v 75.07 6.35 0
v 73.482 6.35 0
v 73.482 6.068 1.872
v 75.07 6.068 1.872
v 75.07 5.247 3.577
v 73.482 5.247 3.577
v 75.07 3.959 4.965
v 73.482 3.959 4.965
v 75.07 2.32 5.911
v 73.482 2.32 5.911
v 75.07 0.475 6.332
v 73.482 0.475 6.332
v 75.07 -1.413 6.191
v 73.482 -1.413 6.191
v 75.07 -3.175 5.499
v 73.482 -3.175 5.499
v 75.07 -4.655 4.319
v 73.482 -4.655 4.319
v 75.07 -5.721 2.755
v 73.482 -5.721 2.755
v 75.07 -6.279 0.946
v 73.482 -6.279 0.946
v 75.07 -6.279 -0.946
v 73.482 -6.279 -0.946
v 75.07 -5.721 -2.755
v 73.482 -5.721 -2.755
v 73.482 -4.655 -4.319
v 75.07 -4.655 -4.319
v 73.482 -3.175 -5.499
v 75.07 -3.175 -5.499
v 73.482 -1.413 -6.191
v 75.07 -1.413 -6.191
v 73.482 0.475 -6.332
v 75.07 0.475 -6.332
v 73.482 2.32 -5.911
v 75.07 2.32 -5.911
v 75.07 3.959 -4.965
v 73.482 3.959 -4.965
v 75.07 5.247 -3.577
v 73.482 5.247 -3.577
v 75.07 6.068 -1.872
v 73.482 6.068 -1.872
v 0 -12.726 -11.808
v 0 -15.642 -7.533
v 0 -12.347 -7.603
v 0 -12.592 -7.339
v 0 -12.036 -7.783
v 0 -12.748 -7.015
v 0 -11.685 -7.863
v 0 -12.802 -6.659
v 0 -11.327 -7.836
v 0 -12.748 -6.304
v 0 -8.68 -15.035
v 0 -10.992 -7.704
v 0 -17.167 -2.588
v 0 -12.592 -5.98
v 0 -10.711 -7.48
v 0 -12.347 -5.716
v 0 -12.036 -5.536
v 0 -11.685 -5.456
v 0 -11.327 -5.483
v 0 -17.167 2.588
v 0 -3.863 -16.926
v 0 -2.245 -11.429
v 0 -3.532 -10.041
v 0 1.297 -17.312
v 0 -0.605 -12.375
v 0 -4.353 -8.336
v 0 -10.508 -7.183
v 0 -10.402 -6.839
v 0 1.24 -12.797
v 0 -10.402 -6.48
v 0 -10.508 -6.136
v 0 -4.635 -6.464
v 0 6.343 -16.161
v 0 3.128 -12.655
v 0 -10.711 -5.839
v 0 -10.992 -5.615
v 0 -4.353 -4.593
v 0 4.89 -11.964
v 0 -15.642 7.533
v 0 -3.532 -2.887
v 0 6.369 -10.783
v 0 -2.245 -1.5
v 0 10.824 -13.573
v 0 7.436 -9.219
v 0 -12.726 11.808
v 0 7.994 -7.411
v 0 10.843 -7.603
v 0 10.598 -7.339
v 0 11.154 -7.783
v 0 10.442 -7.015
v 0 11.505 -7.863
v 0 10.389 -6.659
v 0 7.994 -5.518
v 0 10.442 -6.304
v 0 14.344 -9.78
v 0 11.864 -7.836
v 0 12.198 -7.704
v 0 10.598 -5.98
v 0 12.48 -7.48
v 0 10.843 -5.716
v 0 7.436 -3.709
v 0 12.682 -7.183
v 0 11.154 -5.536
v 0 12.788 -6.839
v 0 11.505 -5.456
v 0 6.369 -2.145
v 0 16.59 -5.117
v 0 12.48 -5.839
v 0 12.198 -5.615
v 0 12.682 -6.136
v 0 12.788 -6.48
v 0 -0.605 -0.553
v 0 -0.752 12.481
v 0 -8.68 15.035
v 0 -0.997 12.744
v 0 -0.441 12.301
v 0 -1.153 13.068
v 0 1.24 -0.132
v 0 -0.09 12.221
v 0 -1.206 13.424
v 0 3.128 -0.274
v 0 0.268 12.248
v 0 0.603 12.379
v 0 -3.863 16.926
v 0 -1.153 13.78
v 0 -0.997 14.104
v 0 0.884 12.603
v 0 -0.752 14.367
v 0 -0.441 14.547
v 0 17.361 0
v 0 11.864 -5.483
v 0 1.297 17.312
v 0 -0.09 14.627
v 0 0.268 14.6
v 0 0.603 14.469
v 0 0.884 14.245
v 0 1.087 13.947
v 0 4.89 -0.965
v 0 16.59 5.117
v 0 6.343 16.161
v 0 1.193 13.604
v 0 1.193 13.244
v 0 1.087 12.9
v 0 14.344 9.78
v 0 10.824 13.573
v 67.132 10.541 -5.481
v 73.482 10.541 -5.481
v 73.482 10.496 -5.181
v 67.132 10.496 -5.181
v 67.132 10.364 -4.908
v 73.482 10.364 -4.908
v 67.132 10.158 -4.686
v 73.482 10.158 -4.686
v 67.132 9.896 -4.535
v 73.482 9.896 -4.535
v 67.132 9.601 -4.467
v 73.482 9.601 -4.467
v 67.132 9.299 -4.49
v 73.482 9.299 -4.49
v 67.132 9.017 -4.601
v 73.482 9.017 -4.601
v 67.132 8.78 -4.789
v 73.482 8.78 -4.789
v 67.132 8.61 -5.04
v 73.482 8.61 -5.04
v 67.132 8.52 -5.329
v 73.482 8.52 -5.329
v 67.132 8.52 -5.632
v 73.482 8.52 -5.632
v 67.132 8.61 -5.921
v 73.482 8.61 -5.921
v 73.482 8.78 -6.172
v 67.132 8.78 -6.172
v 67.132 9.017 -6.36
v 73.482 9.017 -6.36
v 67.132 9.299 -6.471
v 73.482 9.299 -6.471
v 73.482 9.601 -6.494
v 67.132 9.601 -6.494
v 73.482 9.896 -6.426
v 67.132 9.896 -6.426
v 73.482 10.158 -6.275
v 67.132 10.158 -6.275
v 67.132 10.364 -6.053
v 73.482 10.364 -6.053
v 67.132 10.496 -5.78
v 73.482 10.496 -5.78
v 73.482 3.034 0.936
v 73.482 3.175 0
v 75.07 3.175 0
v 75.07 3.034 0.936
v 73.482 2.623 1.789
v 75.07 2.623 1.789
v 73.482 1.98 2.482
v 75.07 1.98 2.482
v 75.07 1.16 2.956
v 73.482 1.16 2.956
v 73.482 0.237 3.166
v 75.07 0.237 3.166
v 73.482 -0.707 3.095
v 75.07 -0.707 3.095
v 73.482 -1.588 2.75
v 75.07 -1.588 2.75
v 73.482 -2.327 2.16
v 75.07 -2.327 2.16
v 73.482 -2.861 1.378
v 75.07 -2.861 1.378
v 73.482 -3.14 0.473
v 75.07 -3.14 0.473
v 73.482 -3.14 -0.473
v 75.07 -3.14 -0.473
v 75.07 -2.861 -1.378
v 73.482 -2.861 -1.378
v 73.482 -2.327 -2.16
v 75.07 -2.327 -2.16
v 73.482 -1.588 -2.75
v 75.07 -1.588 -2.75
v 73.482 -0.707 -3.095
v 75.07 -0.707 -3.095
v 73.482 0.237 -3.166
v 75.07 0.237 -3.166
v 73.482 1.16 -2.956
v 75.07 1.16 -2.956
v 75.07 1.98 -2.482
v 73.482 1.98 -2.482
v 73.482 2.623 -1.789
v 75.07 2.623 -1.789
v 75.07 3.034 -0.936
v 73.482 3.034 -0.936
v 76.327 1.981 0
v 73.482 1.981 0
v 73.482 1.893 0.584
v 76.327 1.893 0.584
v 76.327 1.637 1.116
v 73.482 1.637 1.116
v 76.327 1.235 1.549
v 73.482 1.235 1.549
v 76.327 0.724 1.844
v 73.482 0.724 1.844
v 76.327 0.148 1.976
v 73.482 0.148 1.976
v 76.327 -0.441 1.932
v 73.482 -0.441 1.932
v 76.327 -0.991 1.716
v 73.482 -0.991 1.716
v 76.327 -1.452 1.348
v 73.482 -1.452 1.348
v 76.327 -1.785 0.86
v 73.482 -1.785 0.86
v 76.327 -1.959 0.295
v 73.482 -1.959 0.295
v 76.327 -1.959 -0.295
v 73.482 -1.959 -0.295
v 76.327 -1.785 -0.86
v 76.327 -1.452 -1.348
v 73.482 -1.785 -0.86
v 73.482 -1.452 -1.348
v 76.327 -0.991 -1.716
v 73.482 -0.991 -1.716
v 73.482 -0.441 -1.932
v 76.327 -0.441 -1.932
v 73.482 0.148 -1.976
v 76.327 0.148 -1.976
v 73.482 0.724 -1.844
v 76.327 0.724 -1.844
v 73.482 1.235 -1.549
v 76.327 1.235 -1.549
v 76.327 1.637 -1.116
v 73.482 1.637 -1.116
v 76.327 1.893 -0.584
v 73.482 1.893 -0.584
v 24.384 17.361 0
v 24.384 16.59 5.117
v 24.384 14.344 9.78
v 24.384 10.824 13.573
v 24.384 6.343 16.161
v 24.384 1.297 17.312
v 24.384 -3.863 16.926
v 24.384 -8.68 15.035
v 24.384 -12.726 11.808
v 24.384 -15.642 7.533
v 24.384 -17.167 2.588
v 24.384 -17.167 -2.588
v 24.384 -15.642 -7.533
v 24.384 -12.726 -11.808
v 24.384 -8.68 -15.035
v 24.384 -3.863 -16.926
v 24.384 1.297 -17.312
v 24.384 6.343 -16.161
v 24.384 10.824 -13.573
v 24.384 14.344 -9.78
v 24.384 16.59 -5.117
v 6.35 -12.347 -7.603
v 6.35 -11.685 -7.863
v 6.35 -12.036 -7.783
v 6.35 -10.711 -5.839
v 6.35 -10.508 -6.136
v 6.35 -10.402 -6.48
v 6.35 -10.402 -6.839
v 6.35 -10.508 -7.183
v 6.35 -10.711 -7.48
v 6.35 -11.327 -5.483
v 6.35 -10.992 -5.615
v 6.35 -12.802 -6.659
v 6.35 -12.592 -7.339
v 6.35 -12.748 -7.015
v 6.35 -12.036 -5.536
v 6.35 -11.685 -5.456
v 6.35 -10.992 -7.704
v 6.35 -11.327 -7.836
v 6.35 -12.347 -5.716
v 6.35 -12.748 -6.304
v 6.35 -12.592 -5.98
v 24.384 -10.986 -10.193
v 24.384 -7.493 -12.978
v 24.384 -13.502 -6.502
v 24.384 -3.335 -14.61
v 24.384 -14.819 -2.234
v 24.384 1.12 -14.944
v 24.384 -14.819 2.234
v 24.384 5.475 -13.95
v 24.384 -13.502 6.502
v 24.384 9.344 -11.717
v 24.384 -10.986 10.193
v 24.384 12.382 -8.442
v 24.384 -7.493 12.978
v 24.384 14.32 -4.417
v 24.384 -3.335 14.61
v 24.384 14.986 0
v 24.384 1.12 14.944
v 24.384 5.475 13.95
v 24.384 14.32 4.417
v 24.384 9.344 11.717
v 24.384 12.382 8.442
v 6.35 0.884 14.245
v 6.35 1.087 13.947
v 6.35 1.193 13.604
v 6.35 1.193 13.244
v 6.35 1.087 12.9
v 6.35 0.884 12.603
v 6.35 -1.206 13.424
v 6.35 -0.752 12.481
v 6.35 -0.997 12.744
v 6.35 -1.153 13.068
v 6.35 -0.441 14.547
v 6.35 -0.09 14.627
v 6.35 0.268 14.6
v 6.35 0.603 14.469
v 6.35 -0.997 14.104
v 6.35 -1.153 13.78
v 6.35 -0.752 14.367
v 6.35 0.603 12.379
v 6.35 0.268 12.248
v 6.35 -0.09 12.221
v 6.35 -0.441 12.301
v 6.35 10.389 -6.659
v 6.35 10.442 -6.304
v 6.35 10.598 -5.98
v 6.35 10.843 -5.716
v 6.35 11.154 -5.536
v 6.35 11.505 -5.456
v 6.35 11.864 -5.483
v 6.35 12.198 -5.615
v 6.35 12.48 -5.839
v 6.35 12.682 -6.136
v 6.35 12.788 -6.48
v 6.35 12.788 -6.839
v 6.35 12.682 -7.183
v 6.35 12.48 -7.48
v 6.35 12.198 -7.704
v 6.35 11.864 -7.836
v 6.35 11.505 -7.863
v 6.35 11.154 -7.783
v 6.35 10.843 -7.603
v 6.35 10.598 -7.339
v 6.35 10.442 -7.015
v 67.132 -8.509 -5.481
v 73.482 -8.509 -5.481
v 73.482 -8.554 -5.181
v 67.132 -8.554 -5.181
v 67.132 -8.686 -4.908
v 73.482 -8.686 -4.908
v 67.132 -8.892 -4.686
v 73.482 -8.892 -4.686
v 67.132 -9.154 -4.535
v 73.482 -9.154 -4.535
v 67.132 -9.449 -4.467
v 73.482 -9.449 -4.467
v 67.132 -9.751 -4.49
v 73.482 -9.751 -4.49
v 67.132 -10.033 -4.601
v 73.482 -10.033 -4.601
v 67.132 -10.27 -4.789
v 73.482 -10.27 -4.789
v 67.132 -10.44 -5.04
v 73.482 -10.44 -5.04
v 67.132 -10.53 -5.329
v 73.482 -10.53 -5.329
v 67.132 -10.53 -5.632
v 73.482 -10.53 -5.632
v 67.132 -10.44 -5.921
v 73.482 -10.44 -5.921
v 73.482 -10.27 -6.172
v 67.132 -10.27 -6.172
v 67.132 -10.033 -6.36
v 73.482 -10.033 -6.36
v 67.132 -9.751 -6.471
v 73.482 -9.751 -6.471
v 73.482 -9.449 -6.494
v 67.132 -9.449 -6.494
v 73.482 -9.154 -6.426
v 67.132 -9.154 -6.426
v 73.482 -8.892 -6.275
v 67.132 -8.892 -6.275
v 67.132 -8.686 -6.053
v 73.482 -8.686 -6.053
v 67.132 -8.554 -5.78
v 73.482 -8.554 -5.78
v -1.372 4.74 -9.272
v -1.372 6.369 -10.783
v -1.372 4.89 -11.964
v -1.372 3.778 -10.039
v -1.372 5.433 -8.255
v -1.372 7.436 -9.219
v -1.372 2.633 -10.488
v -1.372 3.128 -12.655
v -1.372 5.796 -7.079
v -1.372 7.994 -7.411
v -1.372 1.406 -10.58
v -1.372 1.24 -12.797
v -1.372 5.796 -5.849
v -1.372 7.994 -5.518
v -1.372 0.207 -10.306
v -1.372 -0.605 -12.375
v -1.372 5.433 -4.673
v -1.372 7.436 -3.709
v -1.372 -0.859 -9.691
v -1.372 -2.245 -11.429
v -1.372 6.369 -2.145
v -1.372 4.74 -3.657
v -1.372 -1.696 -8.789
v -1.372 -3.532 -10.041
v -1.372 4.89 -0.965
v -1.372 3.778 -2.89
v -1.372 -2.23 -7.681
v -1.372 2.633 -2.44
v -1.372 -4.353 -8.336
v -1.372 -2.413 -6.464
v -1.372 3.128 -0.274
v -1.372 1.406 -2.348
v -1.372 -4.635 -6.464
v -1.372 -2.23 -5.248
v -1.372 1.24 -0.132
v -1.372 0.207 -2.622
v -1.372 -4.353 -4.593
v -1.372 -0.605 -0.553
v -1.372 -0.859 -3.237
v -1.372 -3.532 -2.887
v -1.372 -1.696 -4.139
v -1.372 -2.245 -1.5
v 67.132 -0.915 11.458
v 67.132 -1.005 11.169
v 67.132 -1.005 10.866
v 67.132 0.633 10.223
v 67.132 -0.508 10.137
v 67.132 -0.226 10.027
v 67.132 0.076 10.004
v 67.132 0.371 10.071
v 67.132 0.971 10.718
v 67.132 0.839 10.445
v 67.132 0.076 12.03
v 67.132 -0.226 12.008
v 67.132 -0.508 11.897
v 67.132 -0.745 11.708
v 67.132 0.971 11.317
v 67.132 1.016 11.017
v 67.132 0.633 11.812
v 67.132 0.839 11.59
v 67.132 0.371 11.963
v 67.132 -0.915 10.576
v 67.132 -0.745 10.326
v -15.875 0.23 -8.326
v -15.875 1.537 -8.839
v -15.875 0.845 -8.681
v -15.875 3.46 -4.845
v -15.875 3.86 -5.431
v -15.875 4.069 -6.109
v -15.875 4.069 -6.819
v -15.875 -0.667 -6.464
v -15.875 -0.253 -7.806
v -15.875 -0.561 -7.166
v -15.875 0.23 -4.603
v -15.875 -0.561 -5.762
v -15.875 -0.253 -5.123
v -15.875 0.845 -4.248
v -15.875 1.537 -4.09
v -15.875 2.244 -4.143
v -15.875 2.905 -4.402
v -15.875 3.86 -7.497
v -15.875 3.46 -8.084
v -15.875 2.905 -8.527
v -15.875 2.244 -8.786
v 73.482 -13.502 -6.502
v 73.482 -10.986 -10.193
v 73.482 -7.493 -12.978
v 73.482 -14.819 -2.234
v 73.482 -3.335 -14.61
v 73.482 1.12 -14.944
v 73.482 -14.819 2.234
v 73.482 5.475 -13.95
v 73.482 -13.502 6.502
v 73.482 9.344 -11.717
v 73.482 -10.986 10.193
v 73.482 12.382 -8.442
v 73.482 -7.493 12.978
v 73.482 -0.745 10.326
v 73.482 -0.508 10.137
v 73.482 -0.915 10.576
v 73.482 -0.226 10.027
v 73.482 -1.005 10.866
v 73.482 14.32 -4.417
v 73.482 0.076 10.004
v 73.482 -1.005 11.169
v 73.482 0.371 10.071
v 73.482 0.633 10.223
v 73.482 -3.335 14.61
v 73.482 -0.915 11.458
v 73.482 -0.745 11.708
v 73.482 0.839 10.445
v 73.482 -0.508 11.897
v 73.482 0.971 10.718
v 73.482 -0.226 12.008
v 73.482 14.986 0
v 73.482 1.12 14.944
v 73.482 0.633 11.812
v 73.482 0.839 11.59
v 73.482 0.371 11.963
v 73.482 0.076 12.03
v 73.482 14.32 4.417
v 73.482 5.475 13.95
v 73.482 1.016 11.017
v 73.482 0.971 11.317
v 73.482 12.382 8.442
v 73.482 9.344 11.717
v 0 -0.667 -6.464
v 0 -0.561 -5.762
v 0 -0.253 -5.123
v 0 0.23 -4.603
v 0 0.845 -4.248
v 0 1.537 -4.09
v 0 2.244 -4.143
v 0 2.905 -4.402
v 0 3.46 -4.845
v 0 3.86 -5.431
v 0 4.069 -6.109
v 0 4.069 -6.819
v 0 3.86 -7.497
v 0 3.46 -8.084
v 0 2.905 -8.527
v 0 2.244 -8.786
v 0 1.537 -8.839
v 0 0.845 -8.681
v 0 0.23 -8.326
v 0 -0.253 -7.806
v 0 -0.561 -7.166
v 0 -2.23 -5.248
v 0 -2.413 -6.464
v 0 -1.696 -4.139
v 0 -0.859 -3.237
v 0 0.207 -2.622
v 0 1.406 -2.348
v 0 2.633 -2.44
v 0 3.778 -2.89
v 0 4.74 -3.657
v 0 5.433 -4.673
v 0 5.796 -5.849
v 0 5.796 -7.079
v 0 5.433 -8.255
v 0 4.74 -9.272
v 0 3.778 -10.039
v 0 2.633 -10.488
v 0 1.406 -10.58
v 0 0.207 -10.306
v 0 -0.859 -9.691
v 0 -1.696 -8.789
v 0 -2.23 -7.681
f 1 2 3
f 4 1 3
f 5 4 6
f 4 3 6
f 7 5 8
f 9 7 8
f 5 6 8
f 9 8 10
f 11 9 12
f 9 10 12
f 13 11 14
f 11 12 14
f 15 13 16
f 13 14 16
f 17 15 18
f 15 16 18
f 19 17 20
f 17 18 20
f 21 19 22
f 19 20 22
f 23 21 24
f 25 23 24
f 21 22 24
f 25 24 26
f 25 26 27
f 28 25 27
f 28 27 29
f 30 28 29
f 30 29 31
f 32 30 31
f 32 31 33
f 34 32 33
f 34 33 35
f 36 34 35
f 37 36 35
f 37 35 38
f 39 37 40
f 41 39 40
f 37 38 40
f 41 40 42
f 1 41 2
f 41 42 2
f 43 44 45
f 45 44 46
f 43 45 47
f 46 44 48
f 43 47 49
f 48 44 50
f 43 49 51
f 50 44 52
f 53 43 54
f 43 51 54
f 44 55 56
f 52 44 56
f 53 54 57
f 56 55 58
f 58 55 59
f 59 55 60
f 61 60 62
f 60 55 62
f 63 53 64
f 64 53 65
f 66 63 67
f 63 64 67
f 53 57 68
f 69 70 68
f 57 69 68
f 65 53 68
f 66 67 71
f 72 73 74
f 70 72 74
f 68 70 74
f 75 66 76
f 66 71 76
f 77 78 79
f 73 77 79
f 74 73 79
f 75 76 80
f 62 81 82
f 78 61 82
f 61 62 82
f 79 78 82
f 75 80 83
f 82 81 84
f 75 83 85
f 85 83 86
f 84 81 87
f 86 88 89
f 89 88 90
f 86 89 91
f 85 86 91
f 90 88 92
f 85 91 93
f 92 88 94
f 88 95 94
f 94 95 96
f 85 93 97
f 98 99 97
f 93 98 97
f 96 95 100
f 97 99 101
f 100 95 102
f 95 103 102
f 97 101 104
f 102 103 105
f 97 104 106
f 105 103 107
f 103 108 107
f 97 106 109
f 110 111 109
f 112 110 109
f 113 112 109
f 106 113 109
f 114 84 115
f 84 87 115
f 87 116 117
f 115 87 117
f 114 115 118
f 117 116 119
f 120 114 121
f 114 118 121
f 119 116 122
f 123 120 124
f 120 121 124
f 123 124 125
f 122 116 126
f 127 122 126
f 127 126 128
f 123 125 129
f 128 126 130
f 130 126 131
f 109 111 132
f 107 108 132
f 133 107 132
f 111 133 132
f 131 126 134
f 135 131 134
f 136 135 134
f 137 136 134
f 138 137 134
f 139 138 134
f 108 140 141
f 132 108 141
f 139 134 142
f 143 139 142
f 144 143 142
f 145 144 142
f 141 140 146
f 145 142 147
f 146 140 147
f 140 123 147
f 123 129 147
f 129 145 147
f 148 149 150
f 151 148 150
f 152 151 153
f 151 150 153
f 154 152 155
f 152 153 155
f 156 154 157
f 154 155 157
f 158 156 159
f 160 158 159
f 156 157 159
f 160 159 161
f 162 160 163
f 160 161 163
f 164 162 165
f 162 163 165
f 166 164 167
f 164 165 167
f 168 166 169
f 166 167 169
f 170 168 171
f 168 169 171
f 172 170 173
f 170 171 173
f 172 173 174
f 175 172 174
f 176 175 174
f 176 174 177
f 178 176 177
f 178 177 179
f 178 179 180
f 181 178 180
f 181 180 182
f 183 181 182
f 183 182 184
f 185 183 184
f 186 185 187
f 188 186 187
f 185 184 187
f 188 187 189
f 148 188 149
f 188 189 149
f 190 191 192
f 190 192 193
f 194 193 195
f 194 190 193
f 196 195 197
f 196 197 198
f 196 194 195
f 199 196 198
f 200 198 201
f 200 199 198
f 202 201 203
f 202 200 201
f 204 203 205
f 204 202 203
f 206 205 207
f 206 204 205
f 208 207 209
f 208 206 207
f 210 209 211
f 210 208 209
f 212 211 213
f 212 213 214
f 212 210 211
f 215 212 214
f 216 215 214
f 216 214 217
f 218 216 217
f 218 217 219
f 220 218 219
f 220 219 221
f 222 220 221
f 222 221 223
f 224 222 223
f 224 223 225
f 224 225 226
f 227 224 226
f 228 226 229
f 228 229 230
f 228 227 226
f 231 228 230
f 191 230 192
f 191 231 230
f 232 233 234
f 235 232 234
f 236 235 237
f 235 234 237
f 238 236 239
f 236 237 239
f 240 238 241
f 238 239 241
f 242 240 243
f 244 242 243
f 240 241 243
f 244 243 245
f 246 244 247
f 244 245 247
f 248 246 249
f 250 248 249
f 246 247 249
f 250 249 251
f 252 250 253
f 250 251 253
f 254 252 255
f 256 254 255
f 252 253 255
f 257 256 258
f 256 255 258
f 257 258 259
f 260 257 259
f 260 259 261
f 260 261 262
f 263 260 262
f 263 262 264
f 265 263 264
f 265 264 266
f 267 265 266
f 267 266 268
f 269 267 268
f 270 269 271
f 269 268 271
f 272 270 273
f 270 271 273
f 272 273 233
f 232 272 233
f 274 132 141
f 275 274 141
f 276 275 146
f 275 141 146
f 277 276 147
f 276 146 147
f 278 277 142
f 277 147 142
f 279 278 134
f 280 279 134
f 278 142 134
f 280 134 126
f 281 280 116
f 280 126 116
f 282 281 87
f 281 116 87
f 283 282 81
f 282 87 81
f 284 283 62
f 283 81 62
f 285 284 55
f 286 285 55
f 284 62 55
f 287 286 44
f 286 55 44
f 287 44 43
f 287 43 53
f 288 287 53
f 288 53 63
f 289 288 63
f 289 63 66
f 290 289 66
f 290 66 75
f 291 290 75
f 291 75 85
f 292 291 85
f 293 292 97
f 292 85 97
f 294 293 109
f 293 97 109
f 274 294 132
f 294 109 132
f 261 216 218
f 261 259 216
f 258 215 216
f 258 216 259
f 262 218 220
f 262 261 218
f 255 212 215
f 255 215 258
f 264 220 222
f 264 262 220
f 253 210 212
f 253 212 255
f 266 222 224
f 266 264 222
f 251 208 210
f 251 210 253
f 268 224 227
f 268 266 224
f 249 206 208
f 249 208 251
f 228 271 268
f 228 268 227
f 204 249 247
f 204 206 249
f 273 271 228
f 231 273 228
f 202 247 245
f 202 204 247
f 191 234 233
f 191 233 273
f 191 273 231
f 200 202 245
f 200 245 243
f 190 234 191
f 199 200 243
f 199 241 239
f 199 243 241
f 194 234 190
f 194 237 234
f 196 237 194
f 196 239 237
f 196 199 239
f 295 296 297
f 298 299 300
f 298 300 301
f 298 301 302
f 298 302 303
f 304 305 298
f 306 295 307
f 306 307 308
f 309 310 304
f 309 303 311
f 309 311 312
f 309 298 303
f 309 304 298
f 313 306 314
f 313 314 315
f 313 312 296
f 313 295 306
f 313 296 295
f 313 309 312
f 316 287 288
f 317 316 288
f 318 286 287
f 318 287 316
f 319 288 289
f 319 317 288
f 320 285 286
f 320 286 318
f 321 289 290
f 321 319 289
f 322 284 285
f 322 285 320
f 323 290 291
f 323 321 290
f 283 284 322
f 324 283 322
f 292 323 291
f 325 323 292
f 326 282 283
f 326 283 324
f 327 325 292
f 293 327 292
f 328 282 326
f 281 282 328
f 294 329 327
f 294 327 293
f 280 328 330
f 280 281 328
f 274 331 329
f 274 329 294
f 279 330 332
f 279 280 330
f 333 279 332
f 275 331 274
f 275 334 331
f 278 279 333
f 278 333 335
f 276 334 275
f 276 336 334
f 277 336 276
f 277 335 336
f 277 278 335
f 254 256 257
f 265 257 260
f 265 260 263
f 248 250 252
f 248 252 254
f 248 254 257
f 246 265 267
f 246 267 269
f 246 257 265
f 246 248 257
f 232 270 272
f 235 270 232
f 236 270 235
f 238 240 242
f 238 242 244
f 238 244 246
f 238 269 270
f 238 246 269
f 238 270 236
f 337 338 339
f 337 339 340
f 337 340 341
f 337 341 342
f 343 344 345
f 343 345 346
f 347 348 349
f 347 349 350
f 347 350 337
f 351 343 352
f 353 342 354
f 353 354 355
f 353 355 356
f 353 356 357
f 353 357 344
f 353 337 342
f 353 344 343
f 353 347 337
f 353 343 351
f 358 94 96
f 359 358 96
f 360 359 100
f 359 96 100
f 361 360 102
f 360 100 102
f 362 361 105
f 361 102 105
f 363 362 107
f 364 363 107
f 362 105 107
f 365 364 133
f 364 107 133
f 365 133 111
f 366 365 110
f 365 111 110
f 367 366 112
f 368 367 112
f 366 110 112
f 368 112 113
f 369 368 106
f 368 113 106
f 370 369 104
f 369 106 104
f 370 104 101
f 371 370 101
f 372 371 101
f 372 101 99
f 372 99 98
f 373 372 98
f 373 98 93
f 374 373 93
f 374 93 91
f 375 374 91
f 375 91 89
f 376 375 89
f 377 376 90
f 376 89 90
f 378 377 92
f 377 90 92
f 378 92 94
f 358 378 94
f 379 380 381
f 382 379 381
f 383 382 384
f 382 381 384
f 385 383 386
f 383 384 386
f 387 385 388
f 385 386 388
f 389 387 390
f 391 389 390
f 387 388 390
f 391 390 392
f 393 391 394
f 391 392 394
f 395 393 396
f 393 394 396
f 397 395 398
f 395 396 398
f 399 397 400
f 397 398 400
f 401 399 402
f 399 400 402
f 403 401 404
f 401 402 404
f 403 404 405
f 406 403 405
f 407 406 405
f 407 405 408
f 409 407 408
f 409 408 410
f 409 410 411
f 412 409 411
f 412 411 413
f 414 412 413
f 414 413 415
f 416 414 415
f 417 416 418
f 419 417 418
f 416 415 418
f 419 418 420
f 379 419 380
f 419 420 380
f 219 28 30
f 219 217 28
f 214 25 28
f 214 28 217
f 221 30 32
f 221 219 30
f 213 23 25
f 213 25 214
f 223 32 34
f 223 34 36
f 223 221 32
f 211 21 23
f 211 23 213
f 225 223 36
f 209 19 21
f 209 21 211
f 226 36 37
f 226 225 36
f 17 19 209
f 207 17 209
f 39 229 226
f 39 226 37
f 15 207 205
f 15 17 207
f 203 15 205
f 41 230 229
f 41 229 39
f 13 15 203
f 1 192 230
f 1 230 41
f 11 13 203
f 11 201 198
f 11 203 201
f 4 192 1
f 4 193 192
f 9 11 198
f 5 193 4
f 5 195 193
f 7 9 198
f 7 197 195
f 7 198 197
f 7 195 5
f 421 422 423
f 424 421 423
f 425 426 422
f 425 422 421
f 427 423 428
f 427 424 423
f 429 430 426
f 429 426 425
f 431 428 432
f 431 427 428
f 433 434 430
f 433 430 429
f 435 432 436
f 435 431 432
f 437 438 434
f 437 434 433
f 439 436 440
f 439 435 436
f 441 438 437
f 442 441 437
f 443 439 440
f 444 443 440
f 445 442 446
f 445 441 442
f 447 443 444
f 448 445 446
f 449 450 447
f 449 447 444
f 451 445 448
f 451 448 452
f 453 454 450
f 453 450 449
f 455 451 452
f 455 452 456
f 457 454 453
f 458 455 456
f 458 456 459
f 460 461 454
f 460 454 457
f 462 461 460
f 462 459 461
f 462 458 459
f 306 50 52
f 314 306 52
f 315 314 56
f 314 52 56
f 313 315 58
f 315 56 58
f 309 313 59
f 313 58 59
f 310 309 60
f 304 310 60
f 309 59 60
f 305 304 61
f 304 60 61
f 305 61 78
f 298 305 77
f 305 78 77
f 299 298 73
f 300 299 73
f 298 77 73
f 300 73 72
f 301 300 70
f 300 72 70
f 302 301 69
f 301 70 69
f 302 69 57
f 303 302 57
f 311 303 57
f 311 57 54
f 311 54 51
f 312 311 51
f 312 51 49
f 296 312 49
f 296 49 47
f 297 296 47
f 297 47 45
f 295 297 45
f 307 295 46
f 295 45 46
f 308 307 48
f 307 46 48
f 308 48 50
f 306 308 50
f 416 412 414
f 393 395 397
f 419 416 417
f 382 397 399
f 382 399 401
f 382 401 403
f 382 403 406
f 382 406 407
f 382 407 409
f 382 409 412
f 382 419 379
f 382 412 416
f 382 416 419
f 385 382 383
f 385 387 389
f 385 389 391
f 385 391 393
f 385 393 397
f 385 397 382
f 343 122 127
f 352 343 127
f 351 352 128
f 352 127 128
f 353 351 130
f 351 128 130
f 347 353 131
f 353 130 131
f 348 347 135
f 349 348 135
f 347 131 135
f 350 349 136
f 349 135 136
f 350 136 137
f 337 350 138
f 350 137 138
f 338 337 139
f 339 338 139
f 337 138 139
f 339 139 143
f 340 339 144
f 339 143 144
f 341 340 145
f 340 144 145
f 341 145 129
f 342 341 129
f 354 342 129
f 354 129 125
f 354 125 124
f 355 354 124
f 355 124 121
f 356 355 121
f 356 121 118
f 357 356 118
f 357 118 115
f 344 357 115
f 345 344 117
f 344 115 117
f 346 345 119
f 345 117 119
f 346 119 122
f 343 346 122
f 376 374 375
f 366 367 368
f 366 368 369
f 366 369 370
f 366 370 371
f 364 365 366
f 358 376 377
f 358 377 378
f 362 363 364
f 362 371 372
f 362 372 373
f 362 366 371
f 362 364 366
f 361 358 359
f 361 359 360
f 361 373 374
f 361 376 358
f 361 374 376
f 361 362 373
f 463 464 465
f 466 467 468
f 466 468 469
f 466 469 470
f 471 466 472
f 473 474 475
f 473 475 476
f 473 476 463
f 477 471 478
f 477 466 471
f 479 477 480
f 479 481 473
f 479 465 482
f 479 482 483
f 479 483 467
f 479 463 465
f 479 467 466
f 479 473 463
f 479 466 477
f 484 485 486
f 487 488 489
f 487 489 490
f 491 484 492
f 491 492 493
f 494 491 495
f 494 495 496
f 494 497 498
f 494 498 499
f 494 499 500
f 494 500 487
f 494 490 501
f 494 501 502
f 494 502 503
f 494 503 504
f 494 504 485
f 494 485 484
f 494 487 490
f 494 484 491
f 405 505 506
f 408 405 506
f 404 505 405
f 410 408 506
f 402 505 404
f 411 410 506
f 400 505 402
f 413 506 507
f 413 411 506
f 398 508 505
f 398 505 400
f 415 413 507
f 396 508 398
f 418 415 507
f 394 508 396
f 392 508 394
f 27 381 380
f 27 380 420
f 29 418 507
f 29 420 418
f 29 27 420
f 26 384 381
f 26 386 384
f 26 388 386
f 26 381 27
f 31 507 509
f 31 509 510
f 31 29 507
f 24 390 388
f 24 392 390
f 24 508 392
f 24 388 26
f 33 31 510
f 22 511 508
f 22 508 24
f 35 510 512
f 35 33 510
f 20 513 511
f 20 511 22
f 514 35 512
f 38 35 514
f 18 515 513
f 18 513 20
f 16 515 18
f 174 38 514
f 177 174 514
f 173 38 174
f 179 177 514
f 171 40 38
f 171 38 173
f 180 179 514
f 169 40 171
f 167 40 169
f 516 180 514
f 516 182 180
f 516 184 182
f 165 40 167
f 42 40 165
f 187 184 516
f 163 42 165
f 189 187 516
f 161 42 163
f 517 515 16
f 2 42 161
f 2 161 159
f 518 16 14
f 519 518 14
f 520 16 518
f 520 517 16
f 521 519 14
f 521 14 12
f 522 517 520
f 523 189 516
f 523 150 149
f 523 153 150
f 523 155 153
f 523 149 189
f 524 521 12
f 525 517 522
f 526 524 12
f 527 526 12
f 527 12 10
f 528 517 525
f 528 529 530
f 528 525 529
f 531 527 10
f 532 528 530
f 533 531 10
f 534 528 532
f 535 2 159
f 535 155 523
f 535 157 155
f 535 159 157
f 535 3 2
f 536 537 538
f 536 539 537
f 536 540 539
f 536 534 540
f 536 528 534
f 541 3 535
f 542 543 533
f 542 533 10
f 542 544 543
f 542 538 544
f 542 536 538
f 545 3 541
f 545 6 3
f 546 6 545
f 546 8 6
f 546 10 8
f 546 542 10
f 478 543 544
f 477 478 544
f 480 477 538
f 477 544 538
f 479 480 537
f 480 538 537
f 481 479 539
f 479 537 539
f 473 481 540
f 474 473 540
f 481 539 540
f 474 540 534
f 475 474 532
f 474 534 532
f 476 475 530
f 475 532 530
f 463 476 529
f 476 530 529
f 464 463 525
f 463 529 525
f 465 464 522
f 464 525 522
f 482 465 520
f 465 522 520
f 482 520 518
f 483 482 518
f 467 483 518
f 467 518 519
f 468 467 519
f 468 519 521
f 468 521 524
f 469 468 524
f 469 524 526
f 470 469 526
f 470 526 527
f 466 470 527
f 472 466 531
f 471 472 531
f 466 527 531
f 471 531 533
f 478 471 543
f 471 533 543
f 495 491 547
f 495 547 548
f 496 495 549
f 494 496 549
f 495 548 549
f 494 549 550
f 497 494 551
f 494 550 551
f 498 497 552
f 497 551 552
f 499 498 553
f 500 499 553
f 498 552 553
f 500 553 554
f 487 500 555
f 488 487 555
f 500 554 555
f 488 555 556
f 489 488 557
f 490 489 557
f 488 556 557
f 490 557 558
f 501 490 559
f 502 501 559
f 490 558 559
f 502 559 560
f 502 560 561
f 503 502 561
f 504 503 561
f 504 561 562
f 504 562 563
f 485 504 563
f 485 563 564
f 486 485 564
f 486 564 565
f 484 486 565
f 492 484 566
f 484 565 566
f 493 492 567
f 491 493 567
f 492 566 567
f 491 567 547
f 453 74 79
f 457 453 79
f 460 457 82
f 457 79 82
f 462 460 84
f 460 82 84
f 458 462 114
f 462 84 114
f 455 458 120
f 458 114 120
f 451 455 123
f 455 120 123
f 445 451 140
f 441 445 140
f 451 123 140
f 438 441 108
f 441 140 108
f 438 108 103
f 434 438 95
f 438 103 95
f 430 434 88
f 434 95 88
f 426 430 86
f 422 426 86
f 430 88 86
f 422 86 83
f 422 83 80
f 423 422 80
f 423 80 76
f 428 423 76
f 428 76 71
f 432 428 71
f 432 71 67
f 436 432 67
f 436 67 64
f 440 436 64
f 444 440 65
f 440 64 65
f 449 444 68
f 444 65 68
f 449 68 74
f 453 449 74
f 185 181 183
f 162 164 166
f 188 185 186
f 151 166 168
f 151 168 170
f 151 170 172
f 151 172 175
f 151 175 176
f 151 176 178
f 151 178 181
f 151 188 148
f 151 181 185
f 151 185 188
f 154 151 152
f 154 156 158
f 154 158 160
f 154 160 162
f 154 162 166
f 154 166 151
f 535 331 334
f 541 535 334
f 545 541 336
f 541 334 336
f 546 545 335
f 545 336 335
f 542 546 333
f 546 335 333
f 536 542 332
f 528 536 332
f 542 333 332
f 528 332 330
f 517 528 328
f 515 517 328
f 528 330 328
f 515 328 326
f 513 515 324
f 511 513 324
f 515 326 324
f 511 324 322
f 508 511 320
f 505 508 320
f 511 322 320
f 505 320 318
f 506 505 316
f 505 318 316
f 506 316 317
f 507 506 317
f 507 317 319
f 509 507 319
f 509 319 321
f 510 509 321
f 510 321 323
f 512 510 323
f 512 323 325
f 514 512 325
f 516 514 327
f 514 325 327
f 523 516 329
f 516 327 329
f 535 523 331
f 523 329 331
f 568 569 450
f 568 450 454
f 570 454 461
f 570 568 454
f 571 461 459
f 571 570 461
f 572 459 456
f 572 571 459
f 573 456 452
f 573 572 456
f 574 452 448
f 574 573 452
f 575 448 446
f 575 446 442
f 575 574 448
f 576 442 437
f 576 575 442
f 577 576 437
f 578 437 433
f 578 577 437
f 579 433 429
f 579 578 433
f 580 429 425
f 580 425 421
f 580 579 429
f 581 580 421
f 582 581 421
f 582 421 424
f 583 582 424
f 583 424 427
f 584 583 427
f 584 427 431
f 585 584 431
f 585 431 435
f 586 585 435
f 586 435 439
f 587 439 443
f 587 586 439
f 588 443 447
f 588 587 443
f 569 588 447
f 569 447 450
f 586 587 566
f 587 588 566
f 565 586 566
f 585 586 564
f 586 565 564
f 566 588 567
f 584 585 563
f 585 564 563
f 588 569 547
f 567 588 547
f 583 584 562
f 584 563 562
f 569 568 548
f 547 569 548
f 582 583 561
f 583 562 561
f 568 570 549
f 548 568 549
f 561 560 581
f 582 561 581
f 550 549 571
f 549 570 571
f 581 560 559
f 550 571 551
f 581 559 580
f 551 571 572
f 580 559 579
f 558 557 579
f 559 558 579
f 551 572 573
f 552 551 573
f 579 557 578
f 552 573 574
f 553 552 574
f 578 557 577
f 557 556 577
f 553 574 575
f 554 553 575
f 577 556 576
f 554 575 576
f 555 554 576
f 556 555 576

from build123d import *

# Parameters (mm, degrees)
F0_R      = 17.3609
F1_DEPTH  = 24.384
F2_R      = 14.986
F3_DEPTH  = 49.0982
F4_R      = 1.016
F5_DEPTH  = 6.35
F6_R      = 6.35
F6_R_2    = 3.175
F7_DEPTH  = 1.5875
F8_R      = 1.9812
F9_DEPTH  = 2.8448
F10_R     = 1.2065
F11_DEPTH = 6.35
F12_R     = 6.35
F12_R_2   = 4.1275
F13_DEPTH = 1.3716
F14_R     = 2.38125
F15_DEPTH = 15.875


with BuildPart() as f1:
    # F0 (on Right) → F1 (new body)
    with BuildSketch(Plane.YZ):
        Circle(F0_R)
    extrude(amount=F1_DEPTH)

    # F2 (on face) → F3 (join)
    with BuildSketch(Plane.YZ.offset(24.384)):
        Circle(F2_R)
    extrude(amount=F3_DEPTH)

    # F4 (on face) → F5 (cut)
    with BuildSketch(Plane.YZ.offset(73.4822)):
        with Locations((0, 11.01725)):
            Circle(F4_R)
        with Locations((9.525, -5.480534)):
            Circle(F4_R)
        with Locations((-9.525, -5.480534)):
            Circle(F4_R)
    extrude(amount=-F5_DEPTH, mode=Mode.SUBTRACT)

    # F6 (on face) → F7 (join)
    with BuildSketch(Plane.YZ.offset(73.4822)):
        Circle(F6_R)
        Circle(F6_R_2, mode=Mode.SUBTRACT)
    extrude(amount=F7_DEPTH)

    # F8 (on face) → F9 (join)
    with BuildSketch(Plane.YZ.offset(73.4822)):
        Circle(F8_R)
    extrude(amount=F9_DEPTH)

    # F10 (on face) → F11 (cut)
    with BuildSketch(Plane(origin=(0, 0, 0), x_dir=(0, -1, 0), z_dir=(-1, 0, 0))):
        with Locations((0, 13.4239)):
            Circle(F10_R)
        with Locations((11.5951, -6.659402)):
            Circle(F10_R)
        with Locations((-11.5951, -6.659402)):
            Circle(F10_R)
    extrude(amount=-F11_DEPTH, mode=Mode.SUBTRACT)

    # F12 (on face) → F13 (join)
    with BuildSketch(Plane(origin=(0, 0, 0), x_dir=(0, -1, 0), z_dir=(-1, 0, 0))):
        with Locations((-1.7145, -6.4643)):
            Circle(F12_R)
        with Locations((-1.7145, -6.4643)):
            Circle(F12_R_2, mode=Mode.SUBTRACT)
    extrude(amount=F13_DEPTH)

    # F14 (on face) → F15 (join)
    with BuildSketch(Plane(origin=(0, 0, 0), x_dir=(0, -1, 0), z_dir=(-1, 0, 0))):
        with Locations((-1.7145, -6.4643)):
            Circle(F14_R)
    extrude(amount=F15_DEPTH)


solid = f1.part
